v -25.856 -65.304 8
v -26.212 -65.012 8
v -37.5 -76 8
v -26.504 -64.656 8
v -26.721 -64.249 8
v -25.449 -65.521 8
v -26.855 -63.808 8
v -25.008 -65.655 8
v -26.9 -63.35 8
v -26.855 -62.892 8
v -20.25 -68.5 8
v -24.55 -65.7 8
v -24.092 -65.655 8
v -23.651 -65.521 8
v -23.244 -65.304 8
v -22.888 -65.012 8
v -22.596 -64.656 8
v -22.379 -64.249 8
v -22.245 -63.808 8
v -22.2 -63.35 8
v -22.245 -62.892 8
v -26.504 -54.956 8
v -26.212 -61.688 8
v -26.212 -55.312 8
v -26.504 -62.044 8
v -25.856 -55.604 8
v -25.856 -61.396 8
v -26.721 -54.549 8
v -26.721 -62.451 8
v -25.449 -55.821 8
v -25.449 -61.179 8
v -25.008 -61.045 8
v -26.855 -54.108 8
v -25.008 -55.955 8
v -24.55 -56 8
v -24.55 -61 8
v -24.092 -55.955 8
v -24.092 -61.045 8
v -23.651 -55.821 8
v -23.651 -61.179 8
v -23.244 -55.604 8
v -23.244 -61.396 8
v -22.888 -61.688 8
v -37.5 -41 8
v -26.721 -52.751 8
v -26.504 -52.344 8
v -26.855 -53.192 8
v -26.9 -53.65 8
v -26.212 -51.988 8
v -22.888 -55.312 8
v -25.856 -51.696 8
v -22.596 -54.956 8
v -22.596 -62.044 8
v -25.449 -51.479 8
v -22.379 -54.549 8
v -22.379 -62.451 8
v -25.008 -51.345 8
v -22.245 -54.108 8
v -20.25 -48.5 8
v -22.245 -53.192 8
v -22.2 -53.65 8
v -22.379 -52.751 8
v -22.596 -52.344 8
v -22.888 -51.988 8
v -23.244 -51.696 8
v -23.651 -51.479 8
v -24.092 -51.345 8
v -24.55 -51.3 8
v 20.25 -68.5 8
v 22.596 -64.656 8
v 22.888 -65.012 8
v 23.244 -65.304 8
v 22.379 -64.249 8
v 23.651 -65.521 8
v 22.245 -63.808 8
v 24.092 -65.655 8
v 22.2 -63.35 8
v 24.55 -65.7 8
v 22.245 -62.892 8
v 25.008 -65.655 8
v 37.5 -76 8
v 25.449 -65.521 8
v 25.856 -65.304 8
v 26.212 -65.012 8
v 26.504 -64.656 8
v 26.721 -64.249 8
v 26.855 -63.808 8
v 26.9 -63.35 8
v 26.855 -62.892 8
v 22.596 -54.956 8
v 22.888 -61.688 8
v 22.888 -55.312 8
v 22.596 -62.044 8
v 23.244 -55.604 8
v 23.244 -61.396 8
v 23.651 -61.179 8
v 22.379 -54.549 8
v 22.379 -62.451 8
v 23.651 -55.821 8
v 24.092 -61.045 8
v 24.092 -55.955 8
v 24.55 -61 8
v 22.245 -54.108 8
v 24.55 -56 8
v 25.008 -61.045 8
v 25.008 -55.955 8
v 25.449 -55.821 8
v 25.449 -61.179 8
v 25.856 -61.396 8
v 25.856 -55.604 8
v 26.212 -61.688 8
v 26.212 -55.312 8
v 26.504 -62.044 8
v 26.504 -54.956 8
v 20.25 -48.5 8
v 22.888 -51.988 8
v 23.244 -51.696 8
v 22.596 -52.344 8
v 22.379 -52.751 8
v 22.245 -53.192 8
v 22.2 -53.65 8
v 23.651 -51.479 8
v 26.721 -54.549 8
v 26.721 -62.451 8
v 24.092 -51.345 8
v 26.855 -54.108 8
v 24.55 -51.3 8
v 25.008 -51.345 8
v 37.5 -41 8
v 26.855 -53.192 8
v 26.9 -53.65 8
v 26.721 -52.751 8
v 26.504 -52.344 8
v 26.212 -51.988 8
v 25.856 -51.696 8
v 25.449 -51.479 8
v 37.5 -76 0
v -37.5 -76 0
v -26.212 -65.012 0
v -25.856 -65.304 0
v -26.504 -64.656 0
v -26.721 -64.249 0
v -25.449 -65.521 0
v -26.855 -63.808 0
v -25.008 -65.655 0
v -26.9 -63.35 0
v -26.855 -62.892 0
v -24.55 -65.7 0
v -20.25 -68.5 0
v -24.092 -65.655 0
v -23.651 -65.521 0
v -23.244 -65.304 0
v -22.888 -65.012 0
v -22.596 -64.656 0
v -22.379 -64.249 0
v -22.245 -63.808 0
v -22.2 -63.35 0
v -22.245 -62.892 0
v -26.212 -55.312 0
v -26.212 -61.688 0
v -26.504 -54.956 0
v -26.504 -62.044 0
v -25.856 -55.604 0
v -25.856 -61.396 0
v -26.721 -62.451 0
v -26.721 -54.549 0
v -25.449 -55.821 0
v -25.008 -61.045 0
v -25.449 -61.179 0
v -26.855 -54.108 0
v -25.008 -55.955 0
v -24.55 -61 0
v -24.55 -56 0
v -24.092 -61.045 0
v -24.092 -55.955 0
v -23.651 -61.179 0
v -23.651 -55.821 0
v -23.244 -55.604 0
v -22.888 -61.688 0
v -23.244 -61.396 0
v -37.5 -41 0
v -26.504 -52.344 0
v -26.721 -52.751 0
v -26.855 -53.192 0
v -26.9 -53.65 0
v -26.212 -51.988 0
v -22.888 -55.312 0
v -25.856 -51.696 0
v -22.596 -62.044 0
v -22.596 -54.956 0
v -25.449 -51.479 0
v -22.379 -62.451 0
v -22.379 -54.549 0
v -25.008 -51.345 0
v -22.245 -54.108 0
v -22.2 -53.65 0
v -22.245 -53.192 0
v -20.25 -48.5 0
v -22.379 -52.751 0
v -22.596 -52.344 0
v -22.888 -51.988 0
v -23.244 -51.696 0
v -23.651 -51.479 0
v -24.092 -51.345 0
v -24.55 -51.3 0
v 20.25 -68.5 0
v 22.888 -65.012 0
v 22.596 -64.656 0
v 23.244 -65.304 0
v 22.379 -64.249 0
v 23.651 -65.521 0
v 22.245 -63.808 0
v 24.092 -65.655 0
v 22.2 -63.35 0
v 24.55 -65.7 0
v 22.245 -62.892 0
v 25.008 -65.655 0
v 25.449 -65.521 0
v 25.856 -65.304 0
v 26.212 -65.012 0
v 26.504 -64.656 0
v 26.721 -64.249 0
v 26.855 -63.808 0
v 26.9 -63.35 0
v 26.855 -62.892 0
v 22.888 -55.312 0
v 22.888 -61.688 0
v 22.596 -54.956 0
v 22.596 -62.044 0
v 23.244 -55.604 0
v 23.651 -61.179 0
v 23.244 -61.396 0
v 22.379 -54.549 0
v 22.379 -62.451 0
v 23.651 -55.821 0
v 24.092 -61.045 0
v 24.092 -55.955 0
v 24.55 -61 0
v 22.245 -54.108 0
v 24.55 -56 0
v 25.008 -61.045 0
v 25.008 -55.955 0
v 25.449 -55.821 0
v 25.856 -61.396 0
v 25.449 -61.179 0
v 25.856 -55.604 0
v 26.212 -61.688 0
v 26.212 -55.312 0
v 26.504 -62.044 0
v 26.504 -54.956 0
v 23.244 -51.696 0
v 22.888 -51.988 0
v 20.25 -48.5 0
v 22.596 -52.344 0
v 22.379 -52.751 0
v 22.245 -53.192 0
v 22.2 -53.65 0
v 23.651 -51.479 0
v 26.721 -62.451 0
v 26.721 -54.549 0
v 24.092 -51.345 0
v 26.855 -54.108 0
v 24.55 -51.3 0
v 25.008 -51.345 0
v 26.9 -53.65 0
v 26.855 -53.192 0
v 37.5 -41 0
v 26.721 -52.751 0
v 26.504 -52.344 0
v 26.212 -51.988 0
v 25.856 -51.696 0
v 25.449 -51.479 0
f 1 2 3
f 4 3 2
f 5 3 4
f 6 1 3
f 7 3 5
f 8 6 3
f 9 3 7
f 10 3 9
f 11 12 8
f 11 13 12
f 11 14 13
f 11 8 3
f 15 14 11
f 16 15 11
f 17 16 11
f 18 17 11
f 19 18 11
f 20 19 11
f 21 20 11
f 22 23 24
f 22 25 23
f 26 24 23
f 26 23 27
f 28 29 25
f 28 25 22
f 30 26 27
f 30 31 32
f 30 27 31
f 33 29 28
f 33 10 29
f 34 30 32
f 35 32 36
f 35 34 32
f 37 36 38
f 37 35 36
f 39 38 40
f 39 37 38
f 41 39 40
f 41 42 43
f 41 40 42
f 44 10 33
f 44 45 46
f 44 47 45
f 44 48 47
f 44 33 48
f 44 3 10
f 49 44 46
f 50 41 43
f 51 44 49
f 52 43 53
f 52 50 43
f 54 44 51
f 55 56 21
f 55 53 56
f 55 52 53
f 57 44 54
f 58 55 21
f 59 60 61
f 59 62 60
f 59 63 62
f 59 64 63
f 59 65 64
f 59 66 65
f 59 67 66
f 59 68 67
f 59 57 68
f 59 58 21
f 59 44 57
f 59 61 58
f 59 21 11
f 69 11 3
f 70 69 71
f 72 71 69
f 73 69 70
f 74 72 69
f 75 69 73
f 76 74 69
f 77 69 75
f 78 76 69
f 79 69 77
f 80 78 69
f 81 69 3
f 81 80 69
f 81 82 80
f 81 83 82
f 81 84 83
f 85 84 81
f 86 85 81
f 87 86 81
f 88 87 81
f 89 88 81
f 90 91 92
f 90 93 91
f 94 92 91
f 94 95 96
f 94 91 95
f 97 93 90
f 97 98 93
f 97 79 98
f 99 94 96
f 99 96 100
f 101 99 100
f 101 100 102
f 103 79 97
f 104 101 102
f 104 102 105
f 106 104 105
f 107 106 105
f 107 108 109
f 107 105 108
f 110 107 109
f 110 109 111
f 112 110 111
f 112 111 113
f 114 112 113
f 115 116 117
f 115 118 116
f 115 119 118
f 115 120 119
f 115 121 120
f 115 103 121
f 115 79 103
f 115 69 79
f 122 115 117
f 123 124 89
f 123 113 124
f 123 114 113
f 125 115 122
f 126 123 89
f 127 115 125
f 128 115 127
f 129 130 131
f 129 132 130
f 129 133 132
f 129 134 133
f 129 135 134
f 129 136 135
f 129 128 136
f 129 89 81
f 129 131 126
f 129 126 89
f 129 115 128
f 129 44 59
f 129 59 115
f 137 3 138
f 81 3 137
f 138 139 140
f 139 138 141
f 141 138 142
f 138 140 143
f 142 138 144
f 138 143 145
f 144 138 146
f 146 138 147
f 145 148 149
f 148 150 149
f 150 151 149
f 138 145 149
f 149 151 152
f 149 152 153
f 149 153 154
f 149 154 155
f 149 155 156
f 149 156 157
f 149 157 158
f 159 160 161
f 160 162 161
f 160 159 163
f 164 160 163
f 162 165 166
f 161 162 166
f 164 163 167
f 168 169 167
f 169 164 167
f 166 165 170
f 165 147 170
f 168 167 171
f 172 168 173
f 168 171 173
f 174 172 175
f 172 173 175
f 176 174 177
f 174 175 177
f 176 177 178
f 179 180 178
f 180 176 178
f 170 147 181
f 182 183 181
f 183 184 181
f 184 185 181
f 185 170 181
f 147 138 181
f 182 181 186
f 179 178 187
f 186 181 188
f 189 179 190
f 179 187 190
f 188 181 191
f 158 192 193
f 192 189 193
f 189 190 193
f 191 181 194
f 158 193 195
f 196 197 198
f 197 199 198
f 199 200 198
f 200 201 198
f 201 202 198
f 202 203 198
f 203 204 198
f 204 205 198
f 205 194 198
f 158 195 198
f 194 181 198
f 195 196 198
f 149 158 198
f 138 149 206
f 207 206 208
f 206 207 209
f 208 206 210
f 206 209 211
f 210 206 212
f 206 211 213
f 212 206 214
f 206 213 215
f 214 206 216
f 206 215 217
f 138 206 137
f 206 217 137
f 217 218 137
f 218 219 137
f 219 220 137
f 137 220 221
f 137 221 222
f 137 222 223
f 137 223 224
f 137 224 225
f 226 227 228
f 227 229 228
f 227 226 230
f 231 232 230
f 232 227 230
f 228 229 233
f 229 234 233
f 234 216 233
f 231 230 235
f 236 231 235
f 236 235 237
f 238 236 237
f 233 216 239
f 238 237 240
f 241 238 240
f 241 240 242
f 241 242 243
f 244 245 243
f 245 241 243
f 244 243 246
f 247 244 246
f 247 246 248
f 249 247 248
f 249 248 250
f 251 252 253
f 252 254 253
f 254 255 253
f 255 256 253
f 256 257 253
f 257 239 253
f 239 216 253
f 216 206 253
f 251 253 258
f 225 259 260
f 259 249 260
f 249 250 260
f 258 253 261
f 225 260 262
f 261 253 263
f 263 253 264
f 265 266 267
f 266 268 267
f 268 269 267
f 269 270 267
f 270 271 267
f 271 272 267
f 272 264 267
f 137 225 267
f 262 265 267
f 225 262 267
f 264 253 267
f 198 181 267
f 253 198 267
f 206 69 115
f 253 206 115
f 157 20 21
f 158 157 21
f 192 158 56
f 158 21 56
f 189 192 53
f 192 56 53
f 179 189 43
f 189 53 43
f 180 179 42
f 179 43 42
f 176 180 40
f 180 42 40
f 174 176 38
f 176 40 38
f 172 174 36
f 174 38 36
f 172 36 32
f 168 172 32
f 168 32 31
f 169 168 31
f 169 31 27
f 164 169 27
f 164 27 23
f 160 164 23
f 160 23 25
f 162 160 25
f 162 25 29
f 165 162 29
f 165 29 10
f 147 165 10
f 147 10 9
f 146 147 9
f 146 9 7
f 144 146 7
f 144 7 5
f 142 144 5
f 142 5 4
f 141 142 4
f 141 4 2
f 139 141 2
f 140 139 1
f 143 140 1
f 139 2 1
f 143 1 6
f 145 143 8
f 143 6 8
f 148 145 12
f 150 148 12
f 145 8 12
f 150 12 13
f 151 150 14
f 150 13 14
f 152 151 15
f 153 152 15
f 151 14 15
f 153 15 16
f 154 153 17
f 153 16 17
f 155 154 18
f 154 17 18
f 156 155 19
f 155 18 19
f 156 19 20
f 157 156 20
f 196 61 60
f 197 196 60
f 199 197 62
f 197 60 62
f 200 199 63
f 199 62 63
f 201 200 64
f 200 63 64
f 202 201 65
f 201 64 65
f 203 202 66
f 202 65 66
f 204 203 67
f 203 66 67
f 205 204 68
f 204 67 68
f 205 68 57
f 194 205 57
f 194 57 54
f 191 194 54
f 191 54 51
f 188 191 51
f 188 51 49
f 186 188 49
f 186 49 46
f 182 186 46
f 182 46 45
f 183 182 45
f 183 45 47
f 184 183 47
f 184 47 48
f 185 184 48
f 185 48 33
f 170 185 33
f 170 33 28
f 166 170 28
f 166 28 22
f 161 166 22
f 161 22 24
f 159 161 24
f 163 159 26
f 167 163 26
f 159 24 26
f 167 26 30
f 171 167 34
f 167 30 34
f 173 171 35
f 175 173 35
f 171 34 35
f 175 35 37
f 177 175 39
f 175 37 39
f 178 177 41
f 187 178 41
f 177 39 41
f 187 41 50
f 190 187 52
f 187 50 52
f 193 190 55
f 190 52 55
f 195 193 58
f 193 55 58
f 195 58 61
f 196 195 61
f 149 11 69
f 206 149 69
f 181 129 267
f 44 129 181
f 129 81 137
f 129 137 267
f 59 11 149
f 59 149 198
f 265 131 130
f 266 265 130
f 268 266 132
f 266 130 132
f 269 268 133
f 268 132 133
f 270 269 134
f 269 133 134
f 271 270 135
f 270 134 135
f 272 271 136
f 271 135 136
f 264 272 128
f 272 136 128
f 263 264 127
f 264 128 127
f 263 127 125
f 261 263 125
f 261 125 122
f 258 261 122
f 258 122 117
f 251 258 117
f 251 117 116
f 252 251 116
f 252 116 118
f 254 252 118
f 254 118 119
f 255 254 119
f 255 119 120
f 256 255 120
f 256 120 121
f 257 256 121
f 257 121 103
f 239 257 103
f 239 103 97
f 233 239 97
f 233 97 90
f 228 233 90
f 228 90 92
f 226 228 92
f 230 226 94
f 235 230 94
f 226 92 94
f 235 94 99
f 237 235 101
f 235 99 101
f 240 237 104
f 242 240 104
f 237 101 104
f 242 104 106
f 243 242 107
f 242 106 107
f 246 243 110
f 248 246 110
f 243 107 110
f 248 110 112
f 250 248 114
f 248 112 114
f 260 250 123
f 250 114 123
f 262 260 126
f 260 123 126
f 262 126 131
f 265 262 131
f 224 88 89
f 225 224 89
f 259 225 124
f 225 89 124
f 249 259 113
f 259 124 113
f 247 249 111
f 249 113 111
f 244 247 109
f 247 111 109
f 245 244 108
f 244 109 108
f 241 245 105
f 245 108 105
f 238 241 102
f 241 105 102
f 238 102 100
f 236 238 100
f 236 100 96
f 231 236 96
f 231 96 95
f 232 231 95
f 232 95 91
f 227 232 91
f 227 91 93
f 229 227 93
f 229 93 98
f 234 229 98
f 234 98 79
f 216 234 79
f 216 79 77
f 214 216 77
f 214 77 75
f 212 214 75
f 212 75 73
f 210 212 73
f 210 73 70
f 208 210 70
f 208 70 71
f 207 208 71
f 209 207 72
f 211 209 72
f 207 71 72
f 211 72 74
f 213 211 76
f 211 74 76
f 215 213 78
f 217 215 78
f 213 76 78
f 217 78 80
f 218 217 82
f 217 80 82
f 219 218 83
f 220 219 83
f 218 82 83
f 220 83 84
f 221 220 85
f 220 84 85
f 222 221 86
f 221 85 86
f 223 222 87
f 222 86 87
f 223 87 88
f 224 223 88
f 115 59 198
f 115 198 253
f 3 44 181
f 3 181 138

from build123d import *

# Parameters (mm, degrees)
SKETCH2_W           = 104
SKETCH2_H           = 66
BOSS_EXTRUDE1_DEPTH = 8
BOSS_EXTRUDE2_DEPTH = 8
SKETCH4_W           = 104
SKETCH4_H           = 10
CUT_EXTRUDE1_DEPTH  = 8
BOSS_EXTRUDE4_DEPTH = 8
CUT_EXTRUDE2_DEPTH  = 8
SKETCH9_R           = 2.5
CUT_EXTRUDE3_DEPTH  = 9
CUT_EXTRUDE4_REACH  = 10
SKETCH10_R          = 2.35
SKETCH10_W          = 40.5
SKETCH10_H          = 20
CUT_EXTRUDE5_REACH  = 10
SKETCH11_W          = 128
SKETCH11_H          = 82


with BuildPart() as part:
    # Sketch2 → Boss-Extrude1 (new body)
    with BuildSketch(Plane.XY):
        Rectangle(SKETCH2_W, SKETCH2_H)
    extrude(amount=BOSS_EXTRUDE1_DEPTH)

    # Sketch3 → Boss-Extrude2 (add, through all)
    with BuildSketch(Plane.XY.offset(8)):
        Polygon((-52, -17), (-60, -17), (-60, -22), (-64, -22), (-64, -2), (-60, -2), (-60, -7), (-52, -7), align=None)
        Polygon((-52, 13), (-60, 13), (-60, 8), (-64, 8), (-64, 28), (-60, 28), (-60, 23), (-52, 23), align=None)
        Polygon((52, -7), (52, -17), (60, -17), (60, -22), (64, -22), (64, -2), (60, -2), (60, -7), align=None)
        Polygon((-32.5, -33), (-32.5, -41), (-37.5, -41), (-37.5, -76), (37.5, -76), (37.5, -41), (32.5, -41), (32.5, -33), (17.5, -33), (17.5, -41), (-17.5, -41), (-17.5, -33), align=None)
    extrude(amount=-BOSS_EXTRUDE2_DEPTH)

    # Sketch4 → Cut-Extrude1 (cut)
    with BuildSketch(Plane.XY.offset(8)):
        with Locations((0, 28)):
            Rectangle(SKETCH4_W, SKETCH4_H)
    extrude(amount=-CUT_EXTRUDE1_DEPTH, mode=Mode.SUBTRACT)

    # Sketch6 → Boss-Extrude4 (add)
    with BuildSketch(Plane.XY.offset(8)):
        with BuildLine():
            Line((52, 17), (52, 0))
            Line((52, 0), (0, 0))
            Line((0, 0), (0, 23))
            Line((0, 23), (42, 23))
            ThreePointArc((42, 23), (57.458350242, 37.430583736), (52, 17))
        make_face()
    extrude(amount=-BOSS_EXTRUDE4_DEPTH)

    # Sketch8 → Cut-Extrude2 (cut)
    with BuildSketch(Plane.XY.offset(8)):
        with BuildLine():
            Line((47.287664075, 17.965775092), (41.287664075, 7.573470247))
            ThreePointArc((41.287664075, 7.573470247), (46.489081435, 5.649562257), (52, 5.028320703))
            Line((52, 5.028320703), (52, 17))
            ThreePointArc((52, 17), (49.590394027, 17.222145828), (47.287664075, 17.965775092))
        make_face()
    extrude(amount=-CUT_EXTRUDE2_DEPTH, mode=Mode.SUBTRACT)

    # Sketch9 → Cut-Extrude3 (cut, through all)
    with BuildSketch(Plane.XY.offset(8)):
        with Locations((51.798896932, 27.998161553)):
            Circle(SKETCH9_R)
    extrude(amount=-CUT_EXTRUDE3_DEPTH, mode=Mode.SUBTRACT)

    # Sketch10 → Cut-Extrude4 (cut, up to next)
    with BuildSketch(Plane.XY.offset(8), mode=Mode.PRIVATE) as cut_extrude4_sk1:
        with Locations((-24.55, -53.65)):
            Circle(SKETCH10_R)
    cut_extrude4_tool1 = extrude(cut_extrude4_sk1.sketch, amount=-CUT_EXTRUDE4_REACH, mode=Mode.PRIVATE) & part.part
    add(cut_extrude4_tool1.solids().sort_by_distance((-24.55, -53.65, 8))[0], mode=Mode.SUBTRACT)
    # Sketch10 → Cut-Extrude4 (cut, up to next)
    with BuildSketch(Plane.XY.offset(8), mode=Mode.PRIVATE) as cut_extrude4_sk2:
        with Locations((-24.55, -63.35)):
            Circle(SKETCH10_R)
    cut_extrude4_tool2 = extrude(cut_extrude4_sk2.sketch, amount=-CUT_EXTRUDE4_REACH, mode=Mode.PRIVATE) & part.part
    add(cut_extrude4_tool2.solids().sort_by_distance((-24.55, -63.35, 8))[0], mode=Mode.SUBTRACT)
    # Sketch10 → Cut-Extrude4 (cut, up to next)
    with BuildSketch(Plane.XY.offset(8), mode=Mode.PRIVATE) as cut_extrude4_sk3:
        with Locations((24.55, -63.35)):
            Circle(SKETCH10_R)
    cut_extrude4_tool3 = extrude(cut_extrude4_sk3.sketch, amount=-CUT_EXTRUDE4_REACH, mode=Mode.PRIVATE) & part.part
    add(cut_extrude4_tool3.solids().sort_by_distance((24.55, -63.35, 8))[0], mode=Mode.SUBTRACT)
    # Sketch10 → Cut-Extrude4 (cut, up to next)
    with BuildSketch(Plane.XY.offset(8), mode=Mode.PRIVATE) as cut_extrude4_sk4:
        with Locations((24.55, -53.65)):
            Circle(SKETCH10_R)
    cut_extrude4_tool4 = extrude(cut_extrude4_sk4.sketch, amount=-CUT_EXTRUDE4_REACH, mode=Mode.PRIVATE) & part.part
    add(cut_extrude4_tool4.solids().sort_by_distance((24.55, -53.65, 8))[0], mode=Mode.SUBTRACT)
    # Sketch10 → Cut-Extrude4 (cut, up to next)
    with BuildSketch(Plane.XY.offset(8), mode=Mode.PRIVATE) as cut_extrude4_sk5:
        with Locations((0, -58.5)):
            Rectangle(SKETCH10_W, SKETCH10_H)
    cut_extrude4_tool5 = extrude(cut_extrude4_sk5.sketch, amount=-CUT_EXTRUDE4_REACH, mode=Mode.PRIVATE) & part.part
    add(cut_extrude4_tool5.solids().sort_by_distance((0, -58.5, 8))[0], mode=Mode.SUBTRACT)

    # Sketch11 → Cut-Extrude5 (cut, up to next)
    with BuildSketch(Plane.XY.offset(8), mode=Mode.PRIVATE) as cut_extrude5_sk1:
        Rectangle(SKETCH11_W, SKETCH11_H)
    cut_extrude5_tool1 = extrude(cut_extrude5_sk1.sketch, amount=-CUT_EXTRUDE5_REACH, mode=Mode.PRIVATE) & part.part
    add(cut_extrude5_tool1.solids().sort_by_distance((0, 0, 8))[0], mode=Mode.SUBTRACT)


solid = part.part
